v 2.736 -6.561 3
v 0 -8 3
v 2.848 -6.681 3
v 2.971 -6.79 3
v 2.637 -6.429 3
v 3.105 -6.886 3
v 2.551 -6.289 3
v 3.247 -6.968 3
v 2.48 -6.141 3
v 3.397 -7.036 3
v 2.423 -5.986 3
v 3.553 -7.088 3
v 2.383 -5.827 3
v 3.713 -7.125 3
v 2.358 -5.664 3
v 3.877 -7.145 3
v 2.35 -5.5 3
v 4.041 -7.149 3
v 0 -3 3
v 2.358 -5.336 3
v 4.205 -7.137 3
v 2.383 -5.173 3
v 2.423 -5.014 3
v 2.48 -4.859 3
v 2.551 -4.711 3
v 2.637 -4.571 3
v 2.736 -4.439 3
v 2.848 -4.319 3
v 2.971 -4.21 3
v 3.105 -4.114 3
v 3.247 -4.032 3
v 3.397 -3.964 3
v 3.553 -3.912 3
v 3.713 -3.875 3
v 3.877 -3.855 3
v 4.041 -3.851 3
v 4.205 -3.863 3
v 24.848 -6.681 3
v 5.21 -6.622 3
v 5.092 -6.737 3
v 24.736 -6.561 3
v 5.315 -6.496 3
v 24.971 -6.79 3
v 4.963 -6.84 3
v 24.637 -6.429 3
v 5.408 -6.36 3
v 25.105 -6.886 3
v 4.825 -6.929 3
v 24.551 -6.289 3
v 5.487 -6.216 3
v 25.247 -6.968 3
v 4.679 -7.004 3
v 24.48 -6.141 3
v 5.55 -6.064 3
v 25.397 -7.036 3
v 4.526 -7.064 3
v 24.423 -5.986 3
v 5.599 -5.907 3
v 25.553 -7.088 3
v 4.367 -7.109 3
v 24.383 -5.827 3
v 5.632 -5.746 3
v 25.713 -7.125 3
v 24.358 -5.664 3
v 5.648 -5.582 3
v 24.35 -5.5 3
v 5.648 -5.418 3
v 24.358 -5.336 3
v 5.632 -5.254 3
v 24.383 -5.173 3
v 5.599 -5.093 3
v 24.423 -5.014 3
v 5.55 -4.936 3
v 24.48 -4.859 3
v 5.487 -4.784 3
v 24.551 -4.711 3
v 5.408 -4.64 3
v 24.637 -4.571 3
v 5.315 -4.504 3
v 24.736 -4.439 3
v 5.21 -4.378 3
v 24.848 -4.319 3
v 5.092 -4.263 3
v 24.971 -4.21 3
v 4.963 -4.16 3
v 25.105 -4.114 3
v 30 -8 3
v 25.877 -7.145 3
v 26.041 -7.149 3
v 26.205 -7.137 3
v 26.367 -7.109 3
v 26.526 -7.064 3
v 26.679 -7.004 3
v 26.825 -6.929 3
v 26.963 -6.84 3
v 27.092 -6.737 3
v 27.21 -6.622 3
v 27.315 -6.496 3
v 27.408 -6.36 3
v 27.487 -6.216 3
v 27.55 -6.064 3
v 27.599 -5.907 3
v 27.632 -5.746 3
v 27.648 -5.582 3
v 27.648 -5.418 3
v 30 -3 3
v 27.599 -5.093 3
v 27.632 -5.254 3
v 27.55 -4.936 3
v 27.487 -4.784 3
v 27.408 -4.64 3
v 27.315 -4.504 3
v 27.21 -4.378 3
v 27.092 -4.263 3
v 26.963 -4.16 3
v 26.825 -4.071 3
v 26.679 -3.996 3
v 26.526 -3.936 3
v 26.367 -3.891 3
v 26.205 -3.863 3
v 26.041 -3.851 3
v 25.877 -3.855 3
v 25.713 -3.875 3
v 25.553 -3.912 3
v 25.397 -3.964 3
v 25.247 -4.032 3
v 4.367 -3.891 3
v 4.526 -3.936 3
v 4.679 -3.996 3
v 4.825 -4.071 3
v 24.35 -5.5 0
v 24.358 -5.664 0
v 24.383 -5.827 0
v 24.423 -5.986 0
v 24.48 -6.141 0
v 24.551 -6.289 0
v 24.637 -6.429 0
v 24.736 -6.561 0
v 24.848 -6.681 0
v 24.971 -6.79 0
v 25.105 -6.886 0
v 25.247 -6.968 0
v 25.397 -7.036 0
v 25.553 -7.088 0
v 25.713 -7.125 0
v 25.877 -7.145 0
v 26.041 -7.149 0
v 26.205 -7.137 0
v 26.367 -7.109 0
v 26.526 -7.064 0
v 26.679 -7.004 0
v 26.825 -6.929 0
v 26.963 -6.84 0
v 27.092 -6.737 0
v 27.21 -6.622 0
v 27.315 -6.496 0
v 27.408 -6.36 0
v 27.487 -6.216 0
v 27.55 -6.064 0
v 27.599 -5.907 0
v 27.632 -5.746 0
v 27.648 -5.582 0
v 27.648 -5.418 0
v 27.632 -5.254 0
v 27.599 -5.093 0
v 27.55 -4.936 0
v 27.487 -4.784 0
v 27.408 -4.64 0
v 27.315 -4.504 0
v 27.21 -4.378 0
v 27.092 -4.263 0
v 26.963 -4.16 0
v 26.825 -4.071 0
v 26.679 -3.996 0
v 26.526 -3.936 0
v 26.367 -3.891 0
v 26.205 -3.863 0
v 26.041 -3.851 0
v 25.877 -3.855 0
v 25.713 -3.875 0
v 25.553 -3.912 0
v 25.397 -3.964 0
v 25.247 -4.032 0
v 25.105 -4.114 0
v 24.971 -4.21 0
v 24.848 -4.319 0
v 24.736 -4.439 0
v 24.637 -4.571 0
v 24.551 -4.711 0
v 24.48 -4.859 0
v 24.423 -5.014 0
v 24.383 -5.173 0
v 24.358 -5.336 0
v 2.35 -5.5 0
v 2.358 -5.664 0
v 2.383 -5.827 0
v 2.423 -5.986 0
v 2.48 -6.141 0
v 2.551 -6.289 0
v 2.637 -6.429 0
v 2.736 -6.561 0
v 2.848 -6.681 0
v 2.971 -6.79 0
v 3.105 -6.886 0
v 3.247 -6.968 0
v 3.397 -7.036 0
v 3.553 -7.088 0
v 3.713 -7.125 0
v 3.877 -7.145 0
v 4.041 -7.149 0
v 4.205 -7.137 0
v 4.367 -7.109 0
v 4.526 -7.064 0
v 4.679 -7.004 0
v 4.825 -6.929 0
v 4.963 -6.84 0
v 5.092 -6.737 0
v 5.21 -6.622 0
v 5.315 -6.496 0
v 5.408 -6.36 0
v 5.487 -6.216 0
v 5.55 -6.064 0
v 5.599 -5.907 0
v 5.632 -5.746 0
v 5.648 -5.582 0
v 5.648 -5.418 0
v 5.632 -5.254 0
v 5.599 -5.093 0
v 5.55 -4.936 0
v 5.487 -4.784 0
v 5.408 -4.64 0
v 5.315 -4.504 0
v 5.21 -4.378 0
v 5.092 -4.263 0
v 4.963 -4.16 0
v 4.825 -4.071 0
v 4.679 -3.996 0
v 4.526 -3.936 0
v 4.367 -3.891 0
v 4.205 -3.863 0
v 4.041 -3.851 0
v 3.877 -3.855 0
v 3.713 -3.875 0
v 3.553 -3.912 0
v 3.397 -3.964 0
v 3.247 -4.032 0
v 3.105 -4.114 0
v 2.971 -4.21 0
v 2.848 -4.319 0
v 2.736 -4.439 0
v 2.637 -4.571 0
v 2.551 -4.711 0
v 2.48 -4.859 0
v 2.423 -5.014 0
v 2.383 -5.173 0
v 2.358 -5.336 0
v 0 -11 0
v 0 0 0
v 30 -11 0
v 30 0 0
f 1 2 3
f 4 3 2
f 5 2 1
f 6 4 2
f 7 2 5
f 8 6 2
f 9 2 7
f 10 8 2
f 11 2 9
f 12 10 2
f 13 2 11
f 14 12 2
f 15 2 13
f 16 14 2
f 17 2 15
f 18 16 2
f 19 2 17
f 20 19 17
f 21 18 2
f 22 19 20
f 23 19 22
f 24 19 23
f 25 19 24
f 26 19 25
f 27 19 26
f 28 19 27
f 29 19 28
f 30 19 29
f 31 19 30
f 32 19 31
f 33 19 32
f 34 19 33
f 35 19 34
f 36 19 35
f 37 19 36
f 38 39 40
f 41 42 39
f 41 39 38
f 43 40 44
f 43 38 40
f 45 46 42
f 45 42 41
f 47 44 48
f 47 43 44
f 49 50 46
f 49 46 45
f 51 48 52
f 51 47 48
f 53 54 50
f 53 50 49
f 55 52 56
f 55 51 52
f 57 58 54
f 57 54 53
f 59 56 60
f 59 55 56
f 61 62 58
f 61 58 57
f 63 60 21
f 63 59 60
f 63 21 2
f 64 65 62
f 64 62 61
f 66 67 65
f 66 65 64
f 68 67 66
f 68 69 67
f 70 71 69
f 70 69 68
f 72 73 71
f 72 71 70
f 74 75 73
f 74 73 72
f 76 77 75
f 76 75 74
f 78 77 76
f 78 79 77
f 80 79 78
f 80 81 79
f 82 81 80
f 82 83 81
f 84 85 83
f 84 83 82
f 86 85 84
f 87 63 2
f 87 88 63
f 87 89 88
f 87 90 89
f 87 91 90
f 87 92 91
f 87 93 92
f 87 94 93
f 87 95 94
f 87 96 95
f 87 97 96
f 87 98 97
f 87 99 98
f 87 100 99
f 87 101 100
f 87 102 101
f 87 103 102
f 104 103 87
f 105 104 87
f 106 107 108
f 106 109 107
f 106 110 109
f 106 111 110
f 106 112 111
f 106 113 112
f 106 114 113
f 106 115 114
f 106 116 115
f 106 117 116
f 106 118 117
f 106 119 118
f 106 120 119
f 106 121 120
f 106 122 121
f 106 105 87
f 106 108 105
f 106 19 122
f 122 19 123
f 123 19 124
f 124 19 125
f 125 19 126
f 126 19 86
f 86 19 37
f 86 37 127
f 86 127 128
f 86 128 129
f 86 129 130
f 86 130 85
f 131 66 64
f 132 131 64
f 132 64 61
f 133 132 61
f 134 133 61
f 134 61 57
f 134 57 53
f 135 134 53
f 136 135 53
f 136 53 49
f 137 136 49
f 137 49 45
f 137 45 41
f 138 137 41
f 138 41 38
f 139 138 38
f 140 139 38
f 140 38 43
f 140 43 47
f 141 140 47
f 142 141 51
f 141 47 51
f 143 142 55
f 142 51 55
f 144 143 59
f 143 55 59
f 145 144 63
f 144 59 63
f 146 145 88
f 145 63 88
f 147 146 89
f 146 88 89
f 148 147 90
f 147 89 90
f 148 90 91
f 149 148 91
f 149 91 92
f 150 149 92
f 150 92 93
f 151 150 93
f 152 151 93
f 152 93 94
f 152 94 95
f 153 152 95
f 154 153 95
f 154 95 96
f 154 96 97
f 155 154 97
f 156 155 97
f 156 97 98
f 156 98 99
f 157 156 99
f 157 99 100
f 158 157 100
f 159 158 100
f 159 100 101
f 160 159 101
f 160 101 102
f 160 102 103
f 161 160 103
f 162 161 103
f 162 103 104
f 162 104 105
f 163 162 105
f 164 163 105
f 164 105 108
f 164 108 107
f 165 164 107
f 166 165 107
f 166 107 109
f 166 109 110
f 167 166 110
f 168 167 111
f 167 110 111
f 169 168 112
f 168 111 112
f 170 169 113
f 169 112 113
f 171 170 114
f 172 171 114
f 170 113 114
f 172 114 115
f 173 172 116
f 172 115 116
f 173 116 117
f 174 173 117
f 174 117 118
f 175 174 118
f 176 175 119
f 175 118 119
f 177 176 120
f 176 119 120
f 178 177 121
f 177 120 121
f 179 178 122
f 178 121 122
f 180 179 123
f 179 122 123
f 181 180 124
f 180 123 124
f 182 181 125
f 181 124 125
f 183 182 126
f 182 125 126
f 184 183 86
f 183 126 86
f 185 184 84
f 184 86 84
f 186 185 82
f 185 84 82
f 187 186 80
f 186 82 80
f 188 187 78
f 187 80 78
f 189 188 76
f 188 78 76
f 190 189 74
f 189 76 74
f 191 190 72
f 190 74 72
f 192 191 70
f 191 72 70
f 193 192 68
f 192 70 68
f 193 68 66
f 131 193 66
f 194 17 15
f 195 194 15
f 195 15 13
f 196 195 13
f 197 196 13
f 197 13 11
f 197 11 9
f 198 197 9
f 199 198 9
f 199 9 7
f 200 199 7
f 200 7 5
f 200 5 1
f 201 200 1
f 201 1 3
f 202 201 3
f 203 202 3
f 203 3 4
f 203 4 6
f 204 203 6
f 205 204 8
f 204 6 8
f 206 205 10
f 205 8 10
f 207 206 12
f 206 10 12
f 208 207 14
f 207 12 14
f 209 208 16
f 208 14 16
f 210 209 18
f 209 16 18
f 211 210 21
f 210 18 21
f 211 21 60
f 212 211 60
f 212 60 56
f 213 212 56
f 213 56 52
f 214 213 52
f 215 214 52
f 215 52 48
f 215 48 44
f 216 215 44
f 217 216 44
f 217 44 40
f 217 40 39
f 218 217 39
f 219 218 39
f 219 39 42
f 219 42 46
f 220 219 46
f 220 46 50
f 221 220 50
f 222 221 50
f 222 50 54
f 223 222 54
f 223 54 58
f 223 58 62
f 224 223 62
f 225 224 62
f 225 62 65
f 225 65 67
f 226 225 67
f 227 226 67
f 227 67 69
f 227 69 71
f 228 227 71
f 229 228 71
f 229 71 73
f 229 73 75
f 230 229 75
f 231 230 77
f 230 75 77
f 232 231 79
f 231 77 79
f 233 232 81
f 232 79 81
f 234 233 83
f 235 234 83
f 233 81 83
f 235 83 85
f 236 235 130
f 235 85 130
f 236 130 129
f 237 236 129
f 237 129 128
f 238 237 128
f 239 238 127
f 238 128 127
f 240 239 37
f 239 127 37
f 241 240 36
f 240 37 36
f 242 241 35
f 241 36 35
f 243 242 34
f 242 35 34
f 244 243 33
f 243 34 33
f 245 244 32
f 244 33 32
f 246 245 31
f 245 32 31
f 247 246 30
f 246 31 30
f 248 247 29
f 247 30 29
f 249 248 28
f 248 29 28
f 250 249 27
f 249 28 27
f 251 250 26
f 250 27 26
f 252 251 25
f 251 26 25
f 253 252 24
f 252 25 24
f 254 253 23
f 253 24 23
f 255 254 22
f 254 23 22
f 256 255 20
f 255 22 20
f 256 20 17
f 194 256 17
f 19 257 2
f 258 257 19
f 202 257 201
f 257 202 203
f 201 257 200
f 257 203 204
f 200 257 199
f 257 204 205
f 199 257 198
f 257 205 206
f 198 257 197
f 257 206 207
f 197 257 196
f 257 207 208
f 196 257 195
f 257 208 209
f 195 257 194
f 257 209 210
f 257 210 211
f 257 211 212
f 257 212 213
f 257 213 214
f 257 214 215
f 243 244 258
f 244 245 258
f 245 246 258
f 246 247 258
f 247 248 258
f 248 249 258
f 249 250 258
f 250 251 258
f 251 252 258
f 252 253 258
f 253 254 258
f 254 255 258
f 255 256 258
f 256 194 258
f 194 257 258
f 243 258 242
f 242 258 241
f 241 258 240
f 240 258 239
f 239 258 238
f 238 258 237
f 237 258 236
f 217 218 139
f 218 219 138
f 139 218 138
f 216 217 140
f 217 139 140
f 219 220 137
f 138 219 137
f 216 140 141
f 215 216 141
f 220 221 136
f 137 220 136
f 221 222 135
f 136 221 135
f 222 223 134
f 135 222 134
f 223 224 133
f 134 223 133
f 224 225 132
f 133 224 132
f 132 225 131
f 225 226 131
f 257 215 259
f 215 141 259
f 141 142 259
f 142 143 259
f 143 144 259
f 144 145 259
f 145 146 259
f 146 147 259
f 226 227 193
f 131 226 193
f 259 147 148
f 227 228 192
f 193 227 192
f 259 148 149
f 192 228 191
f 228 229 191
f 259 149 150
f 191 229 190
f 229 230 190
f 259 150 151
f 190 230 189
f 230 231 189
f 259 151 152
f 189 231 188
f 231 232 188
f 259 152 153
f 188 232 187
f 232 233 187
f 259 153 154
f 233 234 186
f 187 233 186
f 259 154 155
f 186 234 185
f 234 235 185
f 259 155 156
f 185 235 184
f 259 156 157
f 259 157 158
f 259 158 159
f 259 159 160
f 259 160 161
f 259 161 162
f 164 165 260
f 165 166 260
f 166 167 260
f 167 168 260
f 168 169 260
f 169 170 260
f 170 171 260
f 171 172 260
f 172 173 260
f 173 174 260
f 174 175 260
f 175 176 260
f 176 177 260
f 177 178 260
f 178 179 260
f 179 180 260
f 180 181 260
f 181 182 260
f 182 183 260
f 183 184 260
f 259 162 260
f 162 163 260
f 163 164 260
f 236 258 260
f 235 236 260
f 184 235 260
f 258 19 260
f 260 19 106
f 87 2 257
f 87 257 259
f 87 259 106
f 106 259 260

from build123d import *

# Parameters (mm, degrees)
F0_W     = 30
F0_H     = 11
F1_DEPTH = 3
F2_SIZE2 = 2.99999
F2_SIZE  = 2.99999
F3_D     = 3.3


# Not quite as in the source:
# - a fillet or chamfer is up to 0.001 mm smaller than in the source, because OpenCascade refuses the exact size


with BuildPart() as f1:
    # F0 (on Top) → F1 (new body)
    with BuildSketch(Plane.XY):
        with Locations((15, -5.5)):
            Rectangle(F0_W, F0_H)
    extrude(amount=F1_DEPTH)

    # F2 (size 3 and 3 in the source; OpenCascade refuses exactly that, so slightly less here)
    f2_edges = [f1.edges().sort_by_distance(p)[0] for p in [
        (15, -11, 3),
        (15, 0, 3),
    ]]
    chamfer(f2_edges, length=F2_SIZE, length2=F2_SIZE2)

    # F3 (through all)
    with Locations(Plane(origin=(0, 0, 0), x_dir=(1, 0, 0), z_dir=(0, 0, -1))):
        with Locations((4, 5.5), (26, 5.5)):
            Hole(F3_D / 2)


solid = f1.part
